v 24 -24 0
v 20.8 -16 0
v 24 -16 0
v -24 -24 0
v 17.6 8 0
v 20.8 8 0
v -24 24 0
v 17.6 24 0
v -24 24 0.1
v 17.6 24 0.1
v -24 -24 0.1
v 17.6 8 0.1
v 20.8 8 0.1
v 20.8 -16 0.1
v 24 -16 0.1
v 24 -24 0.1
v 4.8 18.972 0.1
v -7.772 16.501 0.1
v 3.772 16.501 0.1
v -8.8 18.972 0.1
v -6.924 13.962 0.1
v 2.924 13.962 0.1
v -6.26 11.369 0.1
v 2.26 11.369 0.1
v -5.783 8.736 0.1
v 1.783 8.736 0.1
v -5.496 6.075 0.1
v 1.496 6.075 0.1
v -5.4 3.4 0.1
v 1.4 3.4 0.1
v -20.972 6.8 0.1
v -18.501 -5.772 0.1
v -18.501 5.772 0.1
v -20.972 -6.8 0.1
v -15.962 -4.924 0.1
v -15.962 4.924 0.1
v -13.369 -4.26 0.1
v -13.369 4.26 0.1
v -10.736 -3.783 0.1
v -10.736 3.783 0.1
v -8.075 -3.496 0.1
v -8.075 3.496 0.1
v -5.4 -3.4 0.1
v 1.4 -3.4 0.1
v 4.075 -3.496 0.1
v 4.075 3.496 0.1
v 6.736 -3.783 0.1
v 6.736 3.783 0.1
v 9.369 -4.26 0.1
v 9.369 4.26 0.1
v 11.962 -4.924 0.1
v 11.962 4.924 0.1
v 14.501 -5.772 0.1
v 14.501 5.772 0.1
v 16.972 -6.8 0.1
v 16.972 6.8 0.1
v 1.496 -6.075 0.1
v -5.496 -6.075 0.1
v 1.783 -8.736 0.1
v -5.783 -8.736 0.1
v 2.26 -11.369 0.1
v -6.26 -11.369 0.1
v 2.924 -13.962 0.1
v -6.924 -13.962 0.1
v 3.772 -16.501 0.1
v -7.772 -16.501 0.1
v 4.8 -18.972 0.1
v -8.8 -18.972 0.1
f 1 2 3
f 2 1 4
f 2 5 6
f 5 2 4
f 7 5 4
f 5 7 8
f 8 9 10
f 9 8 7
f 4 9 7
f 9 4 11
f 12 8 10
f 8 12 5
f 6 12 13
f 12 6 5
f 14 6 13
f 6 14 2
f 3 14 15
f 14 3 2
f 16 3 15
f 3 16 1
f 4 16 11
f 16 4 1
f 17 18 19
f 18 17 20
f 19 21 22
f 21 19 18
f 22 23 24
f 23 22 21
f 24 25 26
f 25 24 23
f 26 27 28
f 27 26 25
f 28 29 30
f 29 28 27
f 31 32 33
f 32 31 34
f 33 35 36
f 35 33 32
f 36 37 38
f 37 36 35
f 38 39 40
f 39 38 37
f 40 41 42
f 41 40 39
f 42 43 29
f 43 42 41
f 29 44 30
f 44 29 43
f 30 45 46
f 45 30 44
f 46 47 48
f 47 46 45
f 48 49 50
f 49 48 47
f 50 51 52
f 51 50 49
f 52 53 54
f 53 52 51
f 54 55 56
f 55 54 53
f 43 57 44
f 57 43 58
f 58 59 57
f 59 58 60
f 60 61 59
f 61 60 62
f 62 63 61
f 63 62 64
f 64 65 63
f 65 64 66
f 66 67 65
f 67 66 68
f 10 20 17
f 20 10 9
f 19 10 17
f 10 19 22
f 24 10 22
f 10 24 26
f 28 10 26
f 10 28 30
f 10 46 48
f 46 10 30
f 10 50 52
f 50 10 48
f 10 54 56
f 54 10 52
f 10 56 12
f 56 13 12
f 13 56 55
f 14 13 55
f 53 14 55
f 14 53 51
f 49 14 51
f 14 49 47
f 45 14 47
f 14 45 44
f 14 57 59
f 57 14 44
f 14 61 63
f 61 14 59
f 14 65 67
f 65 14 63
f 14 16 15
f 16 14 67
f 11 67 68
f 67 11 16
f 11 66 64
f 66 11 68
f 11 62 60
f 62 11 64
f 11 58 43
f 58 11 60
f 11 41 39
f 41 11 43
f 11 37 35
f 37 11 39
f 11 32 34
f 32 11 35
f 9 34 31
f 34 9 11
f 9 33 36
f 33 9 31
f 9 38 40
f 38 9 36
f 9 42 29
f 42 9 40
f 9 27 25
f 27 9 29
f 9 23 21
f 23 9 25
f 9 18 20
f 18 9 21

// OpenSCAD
use <../lib.scad>
function ldraw_lib__4179107c() = [
// 0 Sticker  6.0 x  6.0 with Black Iron Cross on White Background Right
// 0 Name: 4179107c.dat
// 0 Author: Massimo Maso [Sirio]
// 0 !LDRAW_ORG Part UPDATE 2022-06
// 0 !LICENSE Licensed under CC BY 2.0 and CC BY 4.0 : see CAreadme.txt
// 
// 0 BFC CERTIFY CCW
  [0,"BFC","CERTIFY"],
  [0,"BFC","CCW"],
// 
// 0 !KEYWORDS Bricklink 10024stk01, Brickowl 275196, Fokker Dr. I
// 0 !KEYWORDS Rebrickable 44236, Red Baron, Sculptures, Set 10024, Triplane
// 
// 0 !HISTORY 2022-12-20 [PTadmin] Official Update 2022-06
// 
// 
// 0 // Bottom face
// 
// 4 16 -60 0 -60 52 0 -40 60 0 -40 60 0 -60
  [4,16,-60,0,-60,52,0,-40,60,0,-40,60,0,-60],
// 4 16 -60 0 -60 44 0 20 52 0 20 52 0 -40
  [4,16,-60,0,-60,44,0,20,52,0,20,52,0,-40],
// 4 16 -60 0 -60 -60 0 60 44 0 60 44 0 20
  [4,16,-60,0,-60,-60,0,60,44,0,60,44,0,20],
// 0 // Lateral face
// 4 16 -60 0 60 -60 -0.25 60 44 -0.25 60 44 0 60
  [4,16,-60,0,60,-60,-0.25,60,44,-0.25,60,44,0,60],
// 4 16 -60 0 60 -60 0 -60 -60 -0.25 -60 -60 -0.25 60
  [4,16,-60,0,60,-60,0,-60,-60,-0.25,-60,-60,-0.25,60],
// 4 16 44 0 60 44 -0.25 60 44 -0.25 20 44 0 20
  [4,16,44,0,60,44,-0.25,60,44,-0.25,20,44,0,20],
// 4 16 44 0 20 44 -0.25 20 52 -0.25 20 52 0 20
  [4,16,44,0,20,44,-0.25,20,52,-0.25,20,52,0,20],
// 4 16 52 0 20 52 -0.25 20 52 -0.25 -40 52 0 -40
  [4,16,52,0,20,52,-0.25,20,52,-0.25,-40,52,0,-40],
// 4 16 52 0 -40 52 -0.25 -40 60 -0.25 -40 60 0 -40
  [4,16,52,0,-40,52,-0.25,-40,60,-0.25,-40,60,0,-40],
// 4 16 60 0 -40 60 -0.25 -40 60 -0.25 -60 60 0 -60
  [4,16,60,0,-40,60,-0.25,-40,60,-0.25,-60,60,0,-60],
// 4 16 -60 0 -60 60 0 -60 60 -0.25 -60 -60 -0.25 -60
  [4,16,-60,0,-60,60,0,-60,60,-0.25,-60,-60,-0.25,-60],
// 0 // Top faces
// 0 // Black faces
// 4 0 -19.4307 -.25 41.2518 9.4307 -.25 41.2518 12 -.25 47.43 -22 -.25 47.43
  [4,0,-19.4307,-.25,41.2518,9.4307,-.25,41.2518,12,-.25,47.43,-22,-.25,47.43],
// 4 0 -19.4307 -.25 41.2518 -17.3103 -.25 34.9054 7.3103 -.25 34.9054 9.4307 -.25 41.2518
  [4,0,-19.4307,-.25,41.2518,-17.3103,-.25,34.9054,7.3103,-.25,34.9054,9.4307,-.25,41.2518],
// 4 0 -15.6497 -.25 28.4236 5.6497 -.25 28.4236 7.3103 -.25 34.9054 -17.3103 -.25 34.9054
  [4,0,-15.6497,-.25,28.4236,5.6497,-.25,28.4236,7.3103,-.25,34.9054,-17.3103,-.25,34.9054],
// 4 0 -15.6497 -.25 28.4236 -14.4575 -.25 21.8395 4.4575 -.25 21.8395 5.6497 -.25 28.4236
  [4,0,-15.6497,-.25,28.4236,-14.4575,-.25,21.8395,4.4575,-.25,21.8395,5.6497,-.25,28.4236],
// 4 0 -13.7397 -.25 15.1869 3.7397 -.25 15.1869 4.4575 -.25 21.8395 -14.4575 -.25 21.8395
  [4,0,-13.7397,-.25,15.1869,3.7397,-.25,15.1869,4.4575,-.25,21.8395,-14.4575,-.25,21.8395],
// 4 0 -13.7397 -.25 15.1869 -13.5 -.25 8.5 3.5 -.25 8.5 3.7397 -.25 15.1869
  [4,0,-13.7397,-.25,15.1869,-13.5,-.25,8.5,3.5,-.25,8.5,3.7397,-.25,15.1869],
// 4 0 -46.2518 -.25 14.4307 -52.43 -.25 17 -52.43 -.25 -17 -46.2518 -.25 -14.4307
  [4,0,-46.2518,-.25,14.4307,-52.43,-.25,17,-52.43,-.25,-17,-46.2518,-.25,-14.4307],
// 4 0 -46.2518 -.25 14.4307 -46.2518 -.25 -14.4307 -39.9054 -.25 -12.3103 -39.9054 -.25 12.3103
  [4,0,-46.2518,-.25,14.4307,-46.2518,-.25,-14.4307,-39.9054,-.25,-12.3103,-39.9054,-.25,12.3103],
// 4 0 -33.4236 -.25 10.6497 -39.9054 -.25 12.3103 -39.9054 -.25 -12.3103 -33.4236 -.25 -10.6497
  [4,0,-33.4236,-.25,10.6497,-39.9054,-.25,12.3103,-39.9054,-.25,-12.3103,-33.4236,-.25,-10.6497],
// 4 0 -33.4236 -.25 10.6497 -33.4236 -.25 -10.6497 -26.8395 -.25 -9.4575 -26.8395 -.25 9.4575
  [4,0,-33.4236,-.25,10.6497,-33.4236,-.25,-10.6497,-26.8395,-.25,-9.4575,-26.8395,-.25,9.4575],
// 4 0 -20.1869 -.25 8.7397 -26.8395 -.25 9.4575 -26.8395 -.25 -9.4575 -20.1869 -.25 -8.7397
  [4,0,-20.1869,-.25,8.7397,-26.8395,-.25,9.4575,-26.8395,-.25,-9.4575,-20.1869,-.25,-8.7397],
// 4 0 -20.1869 -.25 8.7397 -20.1869 -.25 -8.7397 -13.5 -.25 -8.5 -13.5 -.25 8.5
  [4,0,-20.1869,-.25,8.7397,-20.1869,-.25,-8.7397,-13.5,-.25,-8.5,-13.5,-.25,8.5],
// 4 0 -13.5 -.25 8.5 -13.5 -.25 -8.5 3.5 -.25 -8.5 3.5 -.25 8.5
  [4,0,-13.5,-.25,8.5,-13.5,-.25,-8.5,3.5,-.25,-8.5,3.5,-.25,8.5],
// 4 0 10.1869 -.25 8.7397 3.5 -.25 8.5 3.5 -.25 -8.5 10.1869 -.25 -8.7397
  [4,0,10.1869,-.25,8.7397,3.5,-.25,8.5,3.5,-.25,-8.5,10.1869,-.25,-8.7397],
// 4 0 10.1869 -.25 8.7397 10.1869 -.25 -8.7397 16.8395 -.25 -9.4575 16.8395 -.25 9.4575
  [4,0,10.1869,-.25,8.7397,10.1869,-.25,-8.7397,16.8395,-.25,-9.4575,16.8395,-.25,9.4575],
// 4 0 23.4236 -.25 10.6497 16.8395 -.25 9.4575 16.8395 -.25 -9.4575 23.4236 -.25 -10.6497
  [4,0,23.4236,-.25,10.6497,16.8395,-.25,9.4575,16.8395,-.25,-9.4575,23.4236,-.25,-10.6497],
// 4 0 23.4236 -.25 10.6497 23.4236 -.25 -10.6497 29.9054 -.25 -12.3103 29.9054 -.25 12.3103
  [4,0,23.4236,-.25,10.6497,23.4236,-.25,-10.6497,29.9054,-.25,-12.3103,29.9054,-.25,12.3103],
// 4 0 36.2518 -.25 14.4307 29.9054 -.25 12.3103 29.9054 -.25 -12.3103 36.2518 -.25 -14.4307
  [4,0,36.2518,-.25,14.4307,29.9054,-.25,12.3103,29.9054,-.25,-12.3103,36.2518,-.25,-14.4307],
// 4 0 36.2518 -.25 14.4307 36.2518 -.25 -14.4307 42.43 -.25 -17 42.43 -.25 17
  [4,0,36.2518,-.25,14.4307,36.2518,-.25,-14.4307,42.43,-.25,-17,42.43,-.25,17],
// 4 0 -13.7397 -.25 -15.1869 3.7397 -.25 -15.1869 3.5 -.25 -8.5 -13.5 -.25 -8.5
  [4,0,-13.7397,-.25,-15.1869,3.7397,-.25,-15.1869,3.5,-.25,-8.5,-13.5,-.25,-8.5],
// 4 0 -13.7397 -.25 -15.1869 -14.4575 -.25 -21.8395 4.4575 -.25 -21.8395 3.7397 -.25 -15.1869
  [4,0,-13.7397,-.25,-15.1869,-14.4575,-.25,-21.8395,4.4575,-.25,-21.8395,3.7397,-.25,-15.1869],
// 4 0 -15.6497 -.25 -28.4236 5.6497 -.25 -28.4236 4.4575 -.25 -21.8395 -14.4575 -.25 -21.8395
  [4,0,-15.6497,-.25,-28.4236,5.6497,-.25,-28.4236,4.4575,-.25,-21.8395,-14.4575,-.25,-21.8395],
// 4 0 -15.6497 -.25 -28.4236 -17.3103 -.25 -34.9054 7.3103 -.25 -34.9054 5.6497 -.25 -28.4236
  [4,0,-15.6497,-.25,-28.4236,-17.3103,-.25,-34.9054,7.3103,-.25,-34.9054,5.6497,-.25,-28.4236],
// 4 0 -19.4307 -.25 -41.2518 9.4307 -.25 -41.2518 7.3103 -.25 -34.9054 -17.3103 -.25 -34.9054
  [4,0,-19.4307,-.25,-41.2518,9.4307,-.25,-41.2518,7.3103,-.25,-34.9054,-17.3103,-.25,-34.9054],
// 4 0 -19.4307 -.25 -41.2518 -22 -.25 -47.43 12 -.25 -47.43 9.4307 -.25 -41.2518
  [4,0,-19.4307,-.25,-41.2518,-22,-.25,-47.43,12,-.25,-47.43,9.4307,-.25,-41.2518],
// 0 // White faces
// 4 15 -60 -.25 60 -22 -.25 47.43 12 -.25 47.43 44 -.25 60
  [4,15,-60,-.25,60,-22,-.25,47.43,12,-.25,47.43,44,-.25,60],
// 4 15 44 -.25 60 12 -.25 47.43 9.4307 -.25 41.2518 7.3103 -.25 34.9054
  [4,15,44,-.25,60,12,-.25,47.43,9.4307,-.25,41.2518,7.3103,-.25,34.9054],
// 4 15 44 -.25 60 7.3103 -.25 34.9054 5.6497 -.25 28.4236 4.4575 -.25 21.8395
  [4,15,44,-.25,60,7.3103,-.25,34.9054,5.6497,-.25,28.4236,4.4575,-.25,21.8395],
// 4 15 44 -.25 60 4.4575 -.25 21.8395 3.7397 -.25 15.1869 3.5 -.25 8.5
  [4,15,44,-.25,60,4.4575,-.25,21.8395,3.7397,-.25,15.1869,3.5,-.25,8.5],
// 4 15 44 -.25 60 3.5 -.25 8.5 10.1869 -.25 8.7397 16.8395 -.25 9.4575
  [4,15,44,-.25,60,3.5,-.25,8.5,10.1869,-.25,8.7397,16.8395,-.25,9.4575],
// 4 15 44 -.25 60 16.8395 -.25 9.4575 23.4236 -.25 10.6497 29.9054 -.25 12.3103
  [4,15,44,-.25,60,16.8395,-.25,9.4575,23.4236,-.25,10.6497,29.9054,-.25,12.3103],
// 4 15 44 -.25 60 29.9054 -.25 12.3103 36.2518 -.25 14.4307 42.43 -.25 17
  [4,15,44,-.25,60,29.9054,-.25,12.3103,36.2518,-.25,14.4307,42.43,-.25,17],
// 3 15 44 -.25 60 42.43 -.25 17 44 -.25 20
  [3,15,44,-.25,60,42.43,-.25,17,44,-.25,20],
// 4 15 52 -.25 20 44 -.25 20 42.43 -.25 17 42.43 -.25 -17
  [4,15,52,-.25,20,44,-.25,20,42.43,-.25,17,42.43,-.25,-17],
// 3 15 52 -.25 -40 52 -.25 20 42.43 -.25 -17
  [3,15,52,-.25,-40,52,-.25,20,42.43,-.25,-17],
// 4 15 52 -.25 -40 42.43 -.25 -17 36.2518 -.25 -14.4307 29.9054 -.25 -12.3103
  [4,15,52,-.25,-40,42.43,-.25,-17,36.2518,-.25,-14.4307,29.9054,-.25,-12.3103],
// 4 15 52 -.25 -40 29.9054 -.25 -12.3103 23.4236 -.25 -10.6497 16.8395 -.25 -9.4575
  [4,15,52,-.25,-40,29.9054,-.25,-12.3103,23.4236,-.25,-10.6497,16.8395,-.25,-9.4575],
// 4 15 52 -.25 -40 16.8395 -.25 -9.4575 10.1869 -.25 -8.7397 3.5 -.25 -8.5
  [4,15,52,-.25,-40,16.8395,-.25,-9.4575,10.1869,-.25,-8.7397,3.5,-.25,-8.5],
// 4 15 52 -.25 -40 3.5 -.25 -8.5 3.7397 -.25 -15.1869 4.4575 -.25 -21.8395
  [4,15,52,-.25,-40,3.5,-.25,-8.5,3.7397,-.25,-15.1869,4.4575,-.25,-21.8395],
// 4 15 52 -.25 -40 4.4575 -.25 -21.8395 5.6497 -.25 -28.4236 7.3103 -.25 -34.9054
  [4,15,52,-.25,-40,4.4575,-.25,-21.8395,5.6497,-.25,-28.4236,7.3103,-.25,-34.9054],
// 4 15 52 -.25 -40 7.3103 -.25 -34.9054 9.4307 -.25 -41.2518 12 -.25 -47.43
  [4,15,52,-.25,-40,7.3103,-.25,-34.9054,9.4307,-.25,-41.2518,12,-.25,-47.43],
// 4 15 52 -.25 -40 12 -.25 -47.43 60 -.25 -60 60 -.25 -40
  [4,15,52,-.25,-40,12,-.25,-47.43,60,-.25,-60,60,-.25,-40],
// 4 15 -60 -.25 -60 60 -.25 -60 12 -.25 -47.43 -22 -.25 -47.43
  [4,15,-60,-.25,-60,60,-.25,-60,12,-.25,-47.43,-22,-.25,-47.43],
// 4 15 -60 -.25 -60 -22 -.25 -47.43 -19.4307 -.25 -41.2518 -17.3103 -.25 -34.9054
  [4,15,-60,-.25,-60,-22,-.25,-47.43,-19.4307,-.25,-41.2518,-17.3103,-.25,-34.9054],
// 4 15 -60 -.25 -60 -17.3103 -.25 -34.9054 -15.6497 -.25 -28.4236 -14.4575 -.25 -21.8395
  [4,15,-60,-.25,-60,-17.3103,-.25,-34.9054,-15.6497,-.25,-28.4236,-14.4575,-.25,-21.8395],
// 4 15 -60 -.25 -60 -14.4575 -.25 -21.8395 -13.7397 -.25 -15.1869 -13.5 -.25 -8.5
  [4,15,-60,-.25,-60,-14.4575,-.25,-21.8395,-13.7397,-.25,-15.1869,-13.5,-.25,-8.5],
// 4 15 -60 -.25 -60 -13.5 -.25 -8.5 -20.1869 -.25 -8.7397 -26.8395 -.25 -9.4575
  [4,15,-60,-.25,-60,-13.5,-.25,-8.5,-20.1869,-.25,-8.7397,-26.8395,-.25,-9.4575],
// 4 15 -60 -.25 -60 -26.8395 -.25 -9.4575 -33.4236 -.25 -10.6497 -39.9054 -.25 -12.3103
  [4,15,-60,-.25,-60,-26.8395,-.25,-9.4575,-33.4236,-.25,-10.6497,-39.9054,-.25,-12.3103],
// 4 15 -60 -.25 -60 -39.9054 -.25 -12.3103 -46.2518 -.25 -14.4307 -52.43 -.25 -17
  [4,15,-60,-.25,-60,-39.9054,-.25,-12.3103,-46.2518,-.25,-14.4307,-52.43,-.25,-17],
// 4 15 -60 -.25 -60 -52.43 -.25 -17 -52.43 -.25 17 -60 -.25 60
  [4,15,-60,-.25,-60,-52.43,-.25,-17,-52.43,-.25,17,-60,-.25,60],
// 4 15 -60 -.25 60 -52.43 -.25 17 -46.2518 -.25 14.4307 -39.9054 -.25 12.3103
  [4,15,-60,-.25,60,-52.43,-.25,17,-46.2518,-.25,14.4307,-39.9054,-.25,12.3103],
// 4 15 -60 -.25 60 -39.9054 -.25 12.3103 -33.4236 -.25 10.6497 -26.8395 -.25 9.4575
  [4,15,-60,-.25,60,-39.9054,-.25,12.3103,-33.4236,-.25,10.6497,-26.8395,-.25,9.4575],
// 4 15 -60 -.25 60 -26.8395 -.25 9.4575 -20.1869 -.25 8.7397 -13.5 -.25 8.5
  [4,15,-60,-.25,60,-26.8395,-.25,9.4575,-20.1869,-.25,8.7397,-13.5,-.25,8.5],
// 4 15 -60 -.25 60 -13.5 -.25 8.5 -13.7397 -.25 15.1869 -14.4575 -.25 21.8395
  [4,15,-60,-.25,60,-13.5,-.25,8.5,-13.7397,-.25,15.1869,-14.4575,-.25,21.8395],
// 4 15 -60 -.25 60 -14.4575 -.25 21.8395 -15.6497 -.25 28.4236 -17.3103 -.25 34.9054
  [4,15,-60,-.25,60,-14.4575,-.25,21.8395,-15.6497,-.25,28.4236,-17.3103,-.25,34.9054],
// 4 15 -60 -.25 60 -17.3103 -.25 34.9054 -19.4307 -.25 41.2518 -22 -.25 47.43
  [4,15,-60,-.25,60,-17.3103,-.25,34.9054,-19.4307,-.25,41.2518,-22,-.25,47.43],
];
makepoly(ldraw_lib__4179107c(), line=0.2);
